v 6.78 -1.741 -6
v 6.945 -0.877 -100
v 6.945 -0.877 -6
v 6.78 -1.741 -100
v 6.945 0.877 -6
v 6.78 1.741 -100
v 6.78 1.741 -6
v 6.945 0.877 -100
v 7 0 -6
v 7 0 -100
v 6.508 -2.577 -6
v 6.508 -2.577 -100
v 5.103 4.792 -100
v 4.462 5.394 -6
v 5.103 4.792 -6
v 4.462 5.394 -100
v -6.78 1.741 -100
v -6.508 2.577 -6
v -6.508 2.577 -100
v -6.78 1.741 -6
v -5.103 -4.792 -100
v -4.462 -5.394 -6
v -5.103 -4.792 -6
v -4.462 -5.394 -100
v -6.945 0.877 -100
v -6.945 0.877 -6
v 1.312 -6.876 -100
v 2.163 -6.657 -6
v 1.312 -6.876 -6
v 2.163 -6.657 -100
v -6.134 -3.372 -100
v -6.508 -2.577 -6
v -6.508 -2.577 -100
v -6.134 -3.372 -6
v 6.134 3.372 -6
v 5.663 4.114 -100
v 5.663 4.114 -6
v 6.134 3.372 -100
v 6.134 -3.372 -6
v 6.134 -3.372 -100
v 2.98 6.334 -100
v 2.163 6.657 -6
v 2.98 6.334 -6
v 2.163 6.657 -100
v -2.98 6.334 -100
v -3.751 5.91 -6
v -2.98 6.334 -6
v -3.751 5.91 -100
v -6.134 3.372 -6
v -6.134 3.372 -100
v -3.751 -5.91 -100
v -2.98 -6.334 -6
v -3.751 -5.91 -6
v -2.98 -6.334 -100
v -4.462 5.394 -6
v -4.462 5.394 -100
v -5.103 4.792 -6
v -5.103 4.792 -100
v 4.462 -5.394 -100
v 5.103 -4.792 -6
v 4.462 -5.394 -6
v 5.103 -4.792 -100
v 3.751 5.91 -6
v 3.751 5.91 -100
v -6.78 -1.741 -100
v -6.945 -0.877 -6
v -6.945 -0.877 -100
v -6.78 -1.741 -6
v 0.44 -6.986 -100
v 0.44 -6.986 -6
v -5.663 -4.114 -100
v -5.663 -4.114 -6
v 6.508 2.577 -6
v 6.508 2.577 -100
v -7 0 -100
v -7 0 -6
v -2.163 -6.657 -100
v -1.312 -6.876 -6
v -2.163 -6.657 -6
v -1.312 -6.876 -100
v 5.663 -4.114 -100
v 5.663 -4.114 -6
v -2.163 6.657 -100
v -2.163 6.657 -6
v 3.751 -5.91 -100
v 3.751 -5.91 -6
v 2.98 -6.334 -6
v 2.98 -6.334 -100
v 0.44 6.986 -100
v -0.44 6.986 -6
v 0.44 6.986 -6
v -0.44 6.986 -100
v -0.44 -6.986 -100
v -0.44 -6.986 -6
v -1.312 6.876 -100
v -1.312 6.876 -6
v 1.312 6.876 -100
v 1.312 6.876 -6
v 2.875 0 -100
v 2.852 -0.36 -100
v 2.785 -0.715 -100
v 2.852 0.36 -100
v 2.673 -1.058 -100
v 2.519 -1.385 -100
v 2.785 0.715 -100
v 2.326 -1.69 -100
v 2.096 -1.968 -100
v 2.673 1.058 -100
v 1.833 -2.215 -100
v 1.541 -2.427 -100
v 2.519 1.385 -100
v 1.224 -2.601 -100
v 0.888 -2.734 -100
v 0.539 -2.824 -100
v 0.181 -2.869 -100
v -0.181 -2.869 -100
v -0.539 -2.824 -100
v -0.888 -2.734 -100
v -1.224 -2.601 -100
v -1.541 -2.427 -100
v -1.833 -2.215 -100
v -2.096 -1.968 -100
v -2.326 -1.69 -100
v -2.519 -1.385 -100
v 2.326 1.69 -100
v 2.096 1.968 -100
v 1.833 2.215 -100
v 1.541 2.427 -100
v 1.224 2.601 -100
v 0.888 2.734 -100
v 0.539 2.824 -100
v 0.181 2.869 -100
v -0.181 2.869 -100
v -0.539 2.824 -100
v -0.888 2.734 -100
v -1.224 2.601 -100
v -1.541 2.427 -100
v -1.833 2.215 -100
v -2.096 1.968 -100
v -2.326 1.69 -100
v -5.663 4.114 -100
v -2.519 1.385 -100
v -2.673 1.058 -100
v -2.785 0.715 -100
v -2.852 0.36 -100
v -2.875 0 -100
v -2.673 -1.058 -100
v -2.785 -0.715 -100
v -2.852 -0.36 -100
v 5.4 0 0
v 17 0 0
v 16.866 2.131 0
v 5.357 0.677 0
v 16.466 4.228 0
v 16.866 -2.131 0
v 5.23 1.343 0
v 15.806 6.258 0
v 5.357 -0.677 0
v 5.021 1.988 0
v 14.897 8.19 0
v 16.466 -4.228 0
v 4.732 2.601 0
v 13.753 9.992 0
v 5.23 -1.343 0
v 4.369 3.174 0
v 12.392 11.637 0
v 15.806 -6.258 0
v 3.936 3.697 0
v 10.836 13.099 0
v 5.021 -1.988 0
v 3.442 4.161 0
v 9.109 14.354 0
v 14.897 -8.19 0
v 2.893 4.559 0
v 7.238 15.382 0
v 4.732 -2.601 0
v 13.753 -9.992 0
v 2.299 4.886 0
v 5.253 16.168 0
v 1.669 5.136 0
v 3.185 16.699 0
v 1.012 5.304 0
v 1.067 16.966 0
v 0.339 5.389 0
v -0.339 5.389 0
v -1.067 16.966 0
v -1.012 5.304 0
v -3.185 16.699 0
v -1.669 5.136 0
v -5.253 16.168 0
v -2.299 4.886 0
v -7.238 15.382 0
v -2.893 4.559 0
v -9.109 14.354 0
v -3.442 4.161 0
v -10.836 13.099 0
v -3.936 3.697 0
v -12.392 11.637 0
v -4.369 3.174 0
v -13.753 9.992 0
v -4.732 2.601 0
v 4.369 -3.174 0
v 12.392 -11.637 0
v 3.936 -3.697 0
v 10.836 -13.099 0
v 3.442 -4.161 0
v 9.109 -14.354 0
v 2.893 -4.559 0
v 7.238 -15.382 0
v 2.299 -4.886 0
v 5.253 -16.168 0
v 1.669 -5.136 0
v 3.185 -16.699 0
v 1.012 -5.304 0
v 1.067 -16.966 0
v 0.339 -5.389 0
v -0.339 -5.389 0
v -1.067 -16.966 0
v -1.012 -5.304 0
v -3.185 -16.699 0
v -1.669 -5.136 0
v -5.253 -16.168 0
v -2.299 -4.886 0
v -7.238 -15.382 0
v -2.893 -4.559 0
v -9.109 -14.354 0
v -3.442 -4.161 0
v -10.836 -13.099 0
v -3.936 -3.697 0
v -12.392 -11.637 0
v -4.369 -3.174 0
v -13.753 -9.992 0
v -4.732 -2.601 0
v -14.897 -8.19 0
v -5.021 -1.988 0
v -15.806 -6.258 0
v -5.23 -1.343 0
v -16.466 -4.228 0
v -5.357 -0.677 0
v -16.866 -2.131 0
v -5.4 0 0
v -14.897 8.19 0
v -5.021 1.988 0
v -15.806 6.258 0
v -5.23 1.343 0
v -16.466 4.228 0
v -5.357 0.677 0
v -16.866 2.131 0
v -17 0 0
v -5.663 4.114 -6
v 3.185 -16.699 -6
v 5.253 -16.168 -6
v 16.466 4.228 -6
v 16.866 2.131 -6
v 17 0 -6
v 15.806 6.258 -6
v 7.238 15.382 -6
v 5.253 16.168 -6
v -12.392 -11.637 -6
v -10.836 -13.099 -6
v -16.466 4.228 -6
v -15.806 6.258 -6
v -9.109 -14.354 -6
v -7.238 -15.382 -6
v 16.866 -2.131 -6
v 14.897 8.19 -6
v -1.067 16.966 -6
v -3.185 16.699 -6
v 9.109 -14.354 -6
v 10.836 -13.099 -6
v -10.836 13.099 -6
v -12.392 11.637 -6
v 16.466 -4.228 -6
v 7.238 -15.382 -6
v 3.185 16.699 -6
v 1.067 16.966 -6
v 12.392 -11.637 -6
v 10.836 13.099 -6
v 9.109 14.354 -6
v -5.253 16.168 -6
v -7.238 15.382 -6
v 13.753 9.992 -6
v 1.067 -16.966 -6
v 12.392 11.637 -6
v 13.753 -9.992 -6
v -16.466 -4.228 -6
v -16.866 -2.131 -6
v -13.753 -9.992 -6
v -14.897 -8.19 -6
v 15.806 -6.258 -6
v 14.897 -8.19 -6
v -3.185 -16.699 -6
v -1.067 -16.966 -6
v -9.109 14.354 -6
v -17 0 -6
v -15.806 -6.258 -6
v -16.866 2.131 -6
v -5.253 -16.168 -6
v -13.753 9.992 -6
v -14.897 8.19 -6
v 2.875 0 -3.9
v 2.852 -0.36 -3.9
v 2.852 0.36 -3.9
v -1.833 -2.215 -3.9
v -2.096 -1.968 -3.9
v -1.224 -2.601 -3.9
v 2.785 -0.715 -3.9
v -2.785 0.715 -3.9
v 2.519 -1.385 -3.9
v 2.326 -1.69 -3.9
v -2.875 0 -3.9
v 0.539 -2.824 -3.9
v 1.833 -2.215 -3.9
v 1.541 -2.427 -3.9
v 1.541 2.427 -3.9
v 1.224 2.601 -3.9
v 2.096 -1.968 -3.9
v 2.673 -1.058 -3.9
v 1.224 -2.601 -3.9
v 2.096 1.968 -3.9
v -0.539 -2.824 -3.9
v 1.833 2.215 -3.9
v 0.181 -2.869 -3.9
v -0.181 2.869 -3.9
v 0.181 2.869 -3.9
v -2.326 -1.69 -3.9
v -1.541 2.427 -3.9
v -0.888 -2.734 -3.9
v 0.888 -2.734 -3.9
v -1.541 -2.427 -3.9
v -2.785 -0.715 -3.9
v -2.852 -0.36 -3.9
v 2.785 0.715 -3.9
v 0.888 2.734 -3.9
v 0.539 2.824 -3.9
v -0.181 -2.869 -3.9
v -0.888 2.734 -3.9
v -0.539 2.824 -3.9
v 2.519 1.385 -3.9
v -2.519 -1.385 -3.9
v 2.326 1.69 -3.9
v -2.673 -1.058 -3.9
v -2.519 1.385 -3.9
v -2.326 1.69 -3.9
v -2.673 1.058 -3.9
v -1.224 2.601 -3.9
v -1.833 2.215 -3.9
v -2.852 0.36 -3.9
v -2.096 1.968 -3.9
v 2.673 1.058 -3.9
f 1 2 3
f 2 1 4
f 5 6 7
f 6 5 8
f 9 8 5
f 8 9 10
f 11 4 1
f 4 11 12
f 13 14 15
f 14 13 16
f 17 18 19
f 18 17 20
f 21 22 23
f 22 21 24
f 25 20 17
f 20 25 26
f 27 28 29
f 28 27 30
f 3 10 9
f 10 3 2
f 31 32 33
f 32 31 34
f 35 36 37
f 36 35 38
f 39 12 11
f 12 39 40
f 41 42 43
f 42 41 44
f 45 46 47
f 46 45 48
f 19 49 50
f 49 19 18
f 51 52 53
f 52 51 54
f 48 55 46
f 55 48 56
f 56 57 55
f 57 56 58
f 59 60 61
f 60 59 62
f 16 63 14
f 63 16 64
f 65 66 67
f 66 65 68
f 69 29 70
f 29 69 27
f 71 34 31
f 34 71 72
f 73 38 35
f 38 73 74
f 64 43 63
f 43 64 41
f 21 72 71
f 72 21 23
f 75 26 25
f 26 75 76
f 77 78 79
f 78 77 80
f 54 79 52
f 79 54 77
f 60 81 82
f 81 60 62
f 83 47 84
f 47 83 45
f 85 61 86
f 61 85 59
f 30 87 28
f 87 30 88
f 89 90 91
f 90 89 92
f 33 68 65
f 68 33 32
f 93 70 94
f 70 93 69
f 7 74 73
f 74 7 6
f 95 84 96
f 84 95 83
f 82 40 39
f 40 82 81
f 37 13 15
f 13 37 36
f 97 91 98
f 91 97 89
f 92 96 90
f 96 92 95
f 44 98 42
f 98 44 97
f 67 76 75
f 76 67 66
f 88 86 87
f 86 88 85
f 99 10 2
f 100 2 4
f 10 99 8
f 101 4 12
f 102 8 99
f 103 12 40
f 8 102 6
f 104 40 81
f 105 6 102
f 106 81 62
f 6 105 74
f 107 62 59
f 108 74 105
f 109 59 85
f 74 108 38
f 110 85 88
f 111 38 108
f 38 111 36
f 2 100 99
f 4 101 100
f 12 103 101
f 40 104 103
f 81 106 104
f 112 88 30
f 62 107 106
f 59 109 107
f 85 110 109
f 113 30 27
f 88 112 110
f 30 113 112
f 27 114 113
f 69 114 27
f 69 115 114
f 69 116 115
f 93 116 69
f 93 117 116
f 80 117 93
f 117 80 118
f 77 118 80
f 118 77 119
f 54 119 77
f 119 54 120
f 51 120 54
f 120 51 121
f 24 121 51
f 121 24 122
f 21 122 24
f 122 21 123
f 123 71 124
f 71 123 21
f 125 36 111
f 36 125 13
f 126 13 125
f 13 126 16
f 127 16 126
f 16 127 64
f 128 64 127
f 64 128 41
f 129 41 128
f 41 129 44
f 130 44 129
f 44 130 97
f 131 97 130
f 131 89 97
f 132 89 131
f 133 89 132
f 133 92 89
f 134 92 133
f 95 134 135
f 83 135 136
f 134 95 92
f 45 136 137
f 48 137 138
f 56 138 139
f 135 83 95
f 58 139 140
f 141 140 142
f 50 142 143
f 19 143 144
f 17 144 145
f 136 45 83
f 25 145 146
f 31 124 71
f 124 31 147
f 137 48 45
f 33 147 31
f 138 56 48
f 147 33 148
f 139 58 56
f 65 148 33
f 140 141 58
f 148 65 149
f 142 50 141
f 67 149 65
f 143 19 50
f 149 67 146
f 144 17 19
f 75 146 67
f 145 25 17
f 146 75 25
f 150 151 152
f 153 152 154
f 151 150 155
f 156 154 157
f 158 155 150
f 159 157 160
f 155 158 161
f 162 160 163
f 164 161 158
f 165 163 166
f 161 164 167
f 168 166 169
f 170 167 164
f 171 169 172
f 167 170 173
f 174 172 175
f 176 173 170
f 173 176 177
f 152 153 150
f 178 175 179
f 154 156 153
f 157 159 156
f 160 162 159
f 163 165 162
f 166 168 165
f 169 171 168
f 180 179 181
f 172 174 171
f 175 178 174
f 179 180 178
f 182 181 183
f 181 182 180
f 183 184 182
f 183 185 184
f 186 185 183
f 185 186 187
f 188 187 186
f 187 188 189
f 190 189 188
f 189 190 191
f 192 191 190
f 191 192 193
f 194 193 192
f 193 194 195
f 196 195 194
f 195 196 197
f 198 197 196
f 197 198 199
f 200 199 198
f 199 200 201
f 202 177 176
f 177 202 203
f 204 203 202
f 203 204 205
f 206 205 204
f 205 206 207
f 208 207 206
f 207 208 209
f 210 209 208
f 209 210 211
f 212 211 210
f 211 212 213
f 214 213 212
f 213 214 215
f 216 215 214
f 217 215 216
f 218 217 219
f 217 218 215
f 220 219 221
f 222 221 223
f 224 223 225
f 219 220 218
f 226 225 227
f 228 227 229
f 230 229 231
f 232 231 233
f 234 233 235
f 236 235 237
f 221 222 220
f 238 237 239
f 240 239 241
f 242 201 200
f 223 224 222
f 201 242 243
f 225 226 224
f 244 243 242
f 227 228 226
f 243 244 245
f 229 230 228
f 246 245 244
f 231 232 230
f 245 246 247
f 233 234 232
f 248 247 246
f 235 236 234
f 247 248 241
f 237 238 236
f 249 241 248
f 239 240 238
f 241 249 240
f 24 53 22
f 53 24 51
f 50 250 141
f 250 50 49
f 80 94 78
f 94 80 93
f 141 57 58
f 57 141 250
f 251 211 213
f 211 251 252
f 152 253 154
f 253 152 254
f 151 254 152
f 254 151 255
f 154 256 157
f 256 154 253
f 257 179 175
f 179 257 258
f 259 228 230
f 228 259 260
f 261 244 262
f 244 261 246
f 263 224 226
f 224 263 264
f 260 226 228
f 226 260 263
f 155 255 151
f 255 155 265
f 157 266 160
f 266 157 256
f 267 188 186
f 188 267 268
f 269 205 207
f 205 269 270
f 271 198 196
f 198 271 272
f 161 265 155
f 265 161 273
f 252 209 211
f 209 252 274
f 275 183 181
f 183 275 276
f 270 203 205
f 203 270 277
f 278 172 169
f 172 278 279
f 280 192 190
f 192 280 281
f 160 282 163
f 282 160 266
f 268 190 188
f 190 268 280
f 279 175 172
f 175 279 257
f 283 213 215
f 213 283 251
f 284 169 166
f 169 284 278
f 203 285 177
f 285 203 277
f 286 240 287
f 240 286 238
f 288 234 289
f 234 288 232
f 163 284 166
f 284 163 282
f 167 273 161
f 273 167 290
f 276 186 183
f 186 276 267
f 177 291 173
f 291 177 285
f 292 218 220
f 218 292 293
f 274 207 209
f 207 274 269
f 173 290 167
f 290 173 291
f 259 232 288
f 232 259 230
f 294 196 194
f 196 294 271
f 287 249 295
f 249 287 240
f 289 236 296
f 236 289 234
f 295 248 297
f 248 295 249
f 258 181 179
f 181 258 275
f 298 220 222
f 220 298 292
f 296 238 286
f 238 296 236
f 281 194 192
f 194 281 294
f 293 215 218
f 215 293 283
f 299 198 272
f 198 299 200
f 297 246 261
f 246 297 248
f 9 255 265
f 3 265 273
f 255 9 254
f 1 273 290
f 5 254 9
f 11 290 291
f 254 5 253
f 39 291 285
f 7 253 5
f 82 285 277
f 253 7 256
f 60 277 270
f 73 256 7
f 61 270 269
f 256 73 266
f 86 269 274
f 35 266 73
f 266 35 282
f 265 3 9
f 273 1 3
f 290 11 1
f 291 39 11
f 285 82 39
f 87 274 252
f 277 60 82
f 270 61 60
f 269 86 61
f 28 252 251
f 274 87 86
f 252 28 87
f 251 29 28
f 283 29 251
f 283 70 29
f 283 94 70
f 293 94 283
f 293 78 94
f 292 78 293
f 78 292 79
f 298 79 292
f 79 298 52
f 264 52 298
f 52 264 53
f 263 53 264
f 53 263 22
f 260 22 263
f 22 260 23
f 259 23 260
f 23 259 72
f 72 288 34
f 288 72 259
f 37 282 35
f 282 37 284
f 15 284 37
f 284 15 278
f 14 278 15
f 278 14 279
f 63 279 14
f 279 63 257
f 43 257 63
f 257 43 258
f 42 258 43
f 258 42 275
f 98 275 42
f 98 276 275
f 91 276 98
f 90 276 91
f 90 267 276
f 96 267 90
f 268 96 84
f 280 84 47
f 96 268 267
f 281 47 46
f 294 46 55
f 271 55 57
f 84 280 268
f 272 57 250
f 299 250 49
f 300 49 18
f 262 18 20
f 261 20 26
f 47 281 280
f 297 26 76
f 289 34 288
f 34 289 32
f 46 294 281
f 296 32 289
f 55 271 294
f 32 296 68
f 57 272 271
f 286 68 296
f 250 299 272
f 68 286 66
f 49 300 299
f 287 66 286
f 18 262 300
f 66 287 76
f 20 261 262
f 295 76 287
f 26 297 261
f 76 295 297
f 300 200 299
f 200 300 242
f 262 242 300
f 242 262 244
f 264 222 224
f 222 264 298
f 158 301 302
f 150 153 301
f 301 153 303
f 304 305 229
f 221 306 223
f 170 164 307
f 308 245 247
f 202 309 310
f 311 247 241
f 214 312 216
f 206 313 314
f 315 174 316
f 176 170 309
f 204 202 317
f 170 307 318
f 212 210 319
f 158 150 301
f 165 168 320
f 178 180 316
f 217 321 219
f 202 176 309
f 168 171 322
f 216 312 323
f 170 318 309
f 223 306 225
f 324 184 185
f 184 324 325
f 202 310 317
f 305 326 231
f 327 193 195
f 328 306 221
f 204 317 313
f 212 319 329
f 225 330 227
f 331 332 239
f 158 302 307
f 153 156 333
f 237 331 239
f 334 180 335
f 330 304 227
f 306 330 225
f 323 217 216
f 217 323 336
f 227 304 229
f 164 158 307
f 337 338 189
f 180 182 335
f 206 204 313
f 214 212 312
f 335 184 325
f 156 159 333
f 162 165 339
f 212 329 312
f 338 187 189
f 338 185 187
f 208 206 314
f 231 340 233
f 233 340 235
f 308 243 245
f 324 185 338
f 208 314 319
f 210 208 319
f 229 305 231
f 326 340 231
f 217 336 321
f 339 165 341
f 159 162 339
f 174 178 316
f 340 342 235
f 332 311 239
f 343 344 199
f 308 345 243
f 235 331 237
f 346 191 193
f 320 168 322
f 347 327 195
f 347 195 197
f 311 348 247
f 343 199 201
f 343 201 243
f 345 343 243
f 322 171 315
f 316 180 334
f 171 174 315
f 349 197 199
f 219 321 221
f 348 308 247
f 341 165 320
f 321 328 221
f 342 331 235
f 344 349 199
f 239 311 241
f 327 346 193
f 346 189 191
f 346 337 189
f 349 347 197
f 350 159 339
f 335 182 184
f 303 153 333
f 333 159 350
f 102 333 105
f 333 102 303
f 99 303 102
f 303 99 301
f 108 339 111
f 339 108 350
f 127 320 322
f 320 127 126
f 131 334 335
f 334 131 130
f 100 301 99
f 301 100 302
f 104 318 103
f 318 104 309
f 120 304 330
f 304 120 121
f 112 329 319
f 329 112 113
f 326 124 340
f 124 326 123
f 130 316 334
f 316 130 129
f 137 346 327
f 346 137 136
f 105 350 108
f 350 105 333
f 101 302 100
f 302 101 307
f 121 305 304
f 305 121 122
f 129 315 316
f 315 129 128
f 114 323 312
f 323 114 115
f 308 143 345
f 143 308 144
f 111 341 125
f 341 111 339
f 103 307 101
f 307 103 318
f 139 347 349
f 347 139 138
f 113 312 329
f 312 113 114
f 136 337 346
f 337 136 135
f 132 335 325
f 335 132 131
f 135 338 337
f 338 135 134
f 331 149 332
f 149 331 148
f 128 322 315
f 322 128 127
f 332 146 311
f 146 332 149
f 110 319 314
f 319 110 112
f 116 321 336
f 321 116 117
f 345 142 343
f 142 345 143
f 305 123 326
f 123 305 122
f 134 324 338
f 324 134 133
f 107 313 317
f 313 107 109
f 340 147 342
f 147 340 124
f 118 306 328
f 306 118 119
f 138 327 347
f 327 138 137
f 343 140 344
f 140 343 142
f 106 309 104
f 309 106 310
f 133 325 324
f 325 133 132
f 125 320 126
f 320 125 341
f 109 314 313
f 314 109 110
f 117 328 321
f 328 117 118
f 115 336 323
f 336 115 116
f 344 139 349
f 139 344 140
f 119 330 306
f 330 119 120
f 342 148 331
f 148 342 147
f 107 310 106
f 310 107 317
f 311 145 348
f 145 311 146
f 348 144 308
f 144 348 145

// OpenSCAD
$fn = 50;


difference() {
	union() {
		translate(v = [0, 0, -100.0000000000]) {
			cylinder(h = 100, r = 7.0000000000);
		}
		translate(v = [0, 0, -6.0000000000]) {
			cylinder(h = 6, r = 17.0000000000);
		}
	}
	union() {
		translate(v = [0, 0, 0]) {
			rotate(a = [0, 0, 0]) {
				difference() {
					union() {
						#translate(v = [0, 0, -100.0000000000]) {
							cylinder(h = 100, r = 2.6000000000);
						}
						#translate(v = [0, 0, -3.9000000000]) {
							cylinder(h = 3.9000000000, r1 = 2.8750000000, r2 = 5.4000000000);
						}
						#translate(v = [0, 0, -100.0000000000]) {
							cylinder(h = 100, r = 2.8750000000);
						}
						#translate(v = [0, 0, -100.0000000000]) {
							cylinder(h = 100, r = 2.6000000000);
						}
					}
					union();
				}
			}
		}
	}
}
